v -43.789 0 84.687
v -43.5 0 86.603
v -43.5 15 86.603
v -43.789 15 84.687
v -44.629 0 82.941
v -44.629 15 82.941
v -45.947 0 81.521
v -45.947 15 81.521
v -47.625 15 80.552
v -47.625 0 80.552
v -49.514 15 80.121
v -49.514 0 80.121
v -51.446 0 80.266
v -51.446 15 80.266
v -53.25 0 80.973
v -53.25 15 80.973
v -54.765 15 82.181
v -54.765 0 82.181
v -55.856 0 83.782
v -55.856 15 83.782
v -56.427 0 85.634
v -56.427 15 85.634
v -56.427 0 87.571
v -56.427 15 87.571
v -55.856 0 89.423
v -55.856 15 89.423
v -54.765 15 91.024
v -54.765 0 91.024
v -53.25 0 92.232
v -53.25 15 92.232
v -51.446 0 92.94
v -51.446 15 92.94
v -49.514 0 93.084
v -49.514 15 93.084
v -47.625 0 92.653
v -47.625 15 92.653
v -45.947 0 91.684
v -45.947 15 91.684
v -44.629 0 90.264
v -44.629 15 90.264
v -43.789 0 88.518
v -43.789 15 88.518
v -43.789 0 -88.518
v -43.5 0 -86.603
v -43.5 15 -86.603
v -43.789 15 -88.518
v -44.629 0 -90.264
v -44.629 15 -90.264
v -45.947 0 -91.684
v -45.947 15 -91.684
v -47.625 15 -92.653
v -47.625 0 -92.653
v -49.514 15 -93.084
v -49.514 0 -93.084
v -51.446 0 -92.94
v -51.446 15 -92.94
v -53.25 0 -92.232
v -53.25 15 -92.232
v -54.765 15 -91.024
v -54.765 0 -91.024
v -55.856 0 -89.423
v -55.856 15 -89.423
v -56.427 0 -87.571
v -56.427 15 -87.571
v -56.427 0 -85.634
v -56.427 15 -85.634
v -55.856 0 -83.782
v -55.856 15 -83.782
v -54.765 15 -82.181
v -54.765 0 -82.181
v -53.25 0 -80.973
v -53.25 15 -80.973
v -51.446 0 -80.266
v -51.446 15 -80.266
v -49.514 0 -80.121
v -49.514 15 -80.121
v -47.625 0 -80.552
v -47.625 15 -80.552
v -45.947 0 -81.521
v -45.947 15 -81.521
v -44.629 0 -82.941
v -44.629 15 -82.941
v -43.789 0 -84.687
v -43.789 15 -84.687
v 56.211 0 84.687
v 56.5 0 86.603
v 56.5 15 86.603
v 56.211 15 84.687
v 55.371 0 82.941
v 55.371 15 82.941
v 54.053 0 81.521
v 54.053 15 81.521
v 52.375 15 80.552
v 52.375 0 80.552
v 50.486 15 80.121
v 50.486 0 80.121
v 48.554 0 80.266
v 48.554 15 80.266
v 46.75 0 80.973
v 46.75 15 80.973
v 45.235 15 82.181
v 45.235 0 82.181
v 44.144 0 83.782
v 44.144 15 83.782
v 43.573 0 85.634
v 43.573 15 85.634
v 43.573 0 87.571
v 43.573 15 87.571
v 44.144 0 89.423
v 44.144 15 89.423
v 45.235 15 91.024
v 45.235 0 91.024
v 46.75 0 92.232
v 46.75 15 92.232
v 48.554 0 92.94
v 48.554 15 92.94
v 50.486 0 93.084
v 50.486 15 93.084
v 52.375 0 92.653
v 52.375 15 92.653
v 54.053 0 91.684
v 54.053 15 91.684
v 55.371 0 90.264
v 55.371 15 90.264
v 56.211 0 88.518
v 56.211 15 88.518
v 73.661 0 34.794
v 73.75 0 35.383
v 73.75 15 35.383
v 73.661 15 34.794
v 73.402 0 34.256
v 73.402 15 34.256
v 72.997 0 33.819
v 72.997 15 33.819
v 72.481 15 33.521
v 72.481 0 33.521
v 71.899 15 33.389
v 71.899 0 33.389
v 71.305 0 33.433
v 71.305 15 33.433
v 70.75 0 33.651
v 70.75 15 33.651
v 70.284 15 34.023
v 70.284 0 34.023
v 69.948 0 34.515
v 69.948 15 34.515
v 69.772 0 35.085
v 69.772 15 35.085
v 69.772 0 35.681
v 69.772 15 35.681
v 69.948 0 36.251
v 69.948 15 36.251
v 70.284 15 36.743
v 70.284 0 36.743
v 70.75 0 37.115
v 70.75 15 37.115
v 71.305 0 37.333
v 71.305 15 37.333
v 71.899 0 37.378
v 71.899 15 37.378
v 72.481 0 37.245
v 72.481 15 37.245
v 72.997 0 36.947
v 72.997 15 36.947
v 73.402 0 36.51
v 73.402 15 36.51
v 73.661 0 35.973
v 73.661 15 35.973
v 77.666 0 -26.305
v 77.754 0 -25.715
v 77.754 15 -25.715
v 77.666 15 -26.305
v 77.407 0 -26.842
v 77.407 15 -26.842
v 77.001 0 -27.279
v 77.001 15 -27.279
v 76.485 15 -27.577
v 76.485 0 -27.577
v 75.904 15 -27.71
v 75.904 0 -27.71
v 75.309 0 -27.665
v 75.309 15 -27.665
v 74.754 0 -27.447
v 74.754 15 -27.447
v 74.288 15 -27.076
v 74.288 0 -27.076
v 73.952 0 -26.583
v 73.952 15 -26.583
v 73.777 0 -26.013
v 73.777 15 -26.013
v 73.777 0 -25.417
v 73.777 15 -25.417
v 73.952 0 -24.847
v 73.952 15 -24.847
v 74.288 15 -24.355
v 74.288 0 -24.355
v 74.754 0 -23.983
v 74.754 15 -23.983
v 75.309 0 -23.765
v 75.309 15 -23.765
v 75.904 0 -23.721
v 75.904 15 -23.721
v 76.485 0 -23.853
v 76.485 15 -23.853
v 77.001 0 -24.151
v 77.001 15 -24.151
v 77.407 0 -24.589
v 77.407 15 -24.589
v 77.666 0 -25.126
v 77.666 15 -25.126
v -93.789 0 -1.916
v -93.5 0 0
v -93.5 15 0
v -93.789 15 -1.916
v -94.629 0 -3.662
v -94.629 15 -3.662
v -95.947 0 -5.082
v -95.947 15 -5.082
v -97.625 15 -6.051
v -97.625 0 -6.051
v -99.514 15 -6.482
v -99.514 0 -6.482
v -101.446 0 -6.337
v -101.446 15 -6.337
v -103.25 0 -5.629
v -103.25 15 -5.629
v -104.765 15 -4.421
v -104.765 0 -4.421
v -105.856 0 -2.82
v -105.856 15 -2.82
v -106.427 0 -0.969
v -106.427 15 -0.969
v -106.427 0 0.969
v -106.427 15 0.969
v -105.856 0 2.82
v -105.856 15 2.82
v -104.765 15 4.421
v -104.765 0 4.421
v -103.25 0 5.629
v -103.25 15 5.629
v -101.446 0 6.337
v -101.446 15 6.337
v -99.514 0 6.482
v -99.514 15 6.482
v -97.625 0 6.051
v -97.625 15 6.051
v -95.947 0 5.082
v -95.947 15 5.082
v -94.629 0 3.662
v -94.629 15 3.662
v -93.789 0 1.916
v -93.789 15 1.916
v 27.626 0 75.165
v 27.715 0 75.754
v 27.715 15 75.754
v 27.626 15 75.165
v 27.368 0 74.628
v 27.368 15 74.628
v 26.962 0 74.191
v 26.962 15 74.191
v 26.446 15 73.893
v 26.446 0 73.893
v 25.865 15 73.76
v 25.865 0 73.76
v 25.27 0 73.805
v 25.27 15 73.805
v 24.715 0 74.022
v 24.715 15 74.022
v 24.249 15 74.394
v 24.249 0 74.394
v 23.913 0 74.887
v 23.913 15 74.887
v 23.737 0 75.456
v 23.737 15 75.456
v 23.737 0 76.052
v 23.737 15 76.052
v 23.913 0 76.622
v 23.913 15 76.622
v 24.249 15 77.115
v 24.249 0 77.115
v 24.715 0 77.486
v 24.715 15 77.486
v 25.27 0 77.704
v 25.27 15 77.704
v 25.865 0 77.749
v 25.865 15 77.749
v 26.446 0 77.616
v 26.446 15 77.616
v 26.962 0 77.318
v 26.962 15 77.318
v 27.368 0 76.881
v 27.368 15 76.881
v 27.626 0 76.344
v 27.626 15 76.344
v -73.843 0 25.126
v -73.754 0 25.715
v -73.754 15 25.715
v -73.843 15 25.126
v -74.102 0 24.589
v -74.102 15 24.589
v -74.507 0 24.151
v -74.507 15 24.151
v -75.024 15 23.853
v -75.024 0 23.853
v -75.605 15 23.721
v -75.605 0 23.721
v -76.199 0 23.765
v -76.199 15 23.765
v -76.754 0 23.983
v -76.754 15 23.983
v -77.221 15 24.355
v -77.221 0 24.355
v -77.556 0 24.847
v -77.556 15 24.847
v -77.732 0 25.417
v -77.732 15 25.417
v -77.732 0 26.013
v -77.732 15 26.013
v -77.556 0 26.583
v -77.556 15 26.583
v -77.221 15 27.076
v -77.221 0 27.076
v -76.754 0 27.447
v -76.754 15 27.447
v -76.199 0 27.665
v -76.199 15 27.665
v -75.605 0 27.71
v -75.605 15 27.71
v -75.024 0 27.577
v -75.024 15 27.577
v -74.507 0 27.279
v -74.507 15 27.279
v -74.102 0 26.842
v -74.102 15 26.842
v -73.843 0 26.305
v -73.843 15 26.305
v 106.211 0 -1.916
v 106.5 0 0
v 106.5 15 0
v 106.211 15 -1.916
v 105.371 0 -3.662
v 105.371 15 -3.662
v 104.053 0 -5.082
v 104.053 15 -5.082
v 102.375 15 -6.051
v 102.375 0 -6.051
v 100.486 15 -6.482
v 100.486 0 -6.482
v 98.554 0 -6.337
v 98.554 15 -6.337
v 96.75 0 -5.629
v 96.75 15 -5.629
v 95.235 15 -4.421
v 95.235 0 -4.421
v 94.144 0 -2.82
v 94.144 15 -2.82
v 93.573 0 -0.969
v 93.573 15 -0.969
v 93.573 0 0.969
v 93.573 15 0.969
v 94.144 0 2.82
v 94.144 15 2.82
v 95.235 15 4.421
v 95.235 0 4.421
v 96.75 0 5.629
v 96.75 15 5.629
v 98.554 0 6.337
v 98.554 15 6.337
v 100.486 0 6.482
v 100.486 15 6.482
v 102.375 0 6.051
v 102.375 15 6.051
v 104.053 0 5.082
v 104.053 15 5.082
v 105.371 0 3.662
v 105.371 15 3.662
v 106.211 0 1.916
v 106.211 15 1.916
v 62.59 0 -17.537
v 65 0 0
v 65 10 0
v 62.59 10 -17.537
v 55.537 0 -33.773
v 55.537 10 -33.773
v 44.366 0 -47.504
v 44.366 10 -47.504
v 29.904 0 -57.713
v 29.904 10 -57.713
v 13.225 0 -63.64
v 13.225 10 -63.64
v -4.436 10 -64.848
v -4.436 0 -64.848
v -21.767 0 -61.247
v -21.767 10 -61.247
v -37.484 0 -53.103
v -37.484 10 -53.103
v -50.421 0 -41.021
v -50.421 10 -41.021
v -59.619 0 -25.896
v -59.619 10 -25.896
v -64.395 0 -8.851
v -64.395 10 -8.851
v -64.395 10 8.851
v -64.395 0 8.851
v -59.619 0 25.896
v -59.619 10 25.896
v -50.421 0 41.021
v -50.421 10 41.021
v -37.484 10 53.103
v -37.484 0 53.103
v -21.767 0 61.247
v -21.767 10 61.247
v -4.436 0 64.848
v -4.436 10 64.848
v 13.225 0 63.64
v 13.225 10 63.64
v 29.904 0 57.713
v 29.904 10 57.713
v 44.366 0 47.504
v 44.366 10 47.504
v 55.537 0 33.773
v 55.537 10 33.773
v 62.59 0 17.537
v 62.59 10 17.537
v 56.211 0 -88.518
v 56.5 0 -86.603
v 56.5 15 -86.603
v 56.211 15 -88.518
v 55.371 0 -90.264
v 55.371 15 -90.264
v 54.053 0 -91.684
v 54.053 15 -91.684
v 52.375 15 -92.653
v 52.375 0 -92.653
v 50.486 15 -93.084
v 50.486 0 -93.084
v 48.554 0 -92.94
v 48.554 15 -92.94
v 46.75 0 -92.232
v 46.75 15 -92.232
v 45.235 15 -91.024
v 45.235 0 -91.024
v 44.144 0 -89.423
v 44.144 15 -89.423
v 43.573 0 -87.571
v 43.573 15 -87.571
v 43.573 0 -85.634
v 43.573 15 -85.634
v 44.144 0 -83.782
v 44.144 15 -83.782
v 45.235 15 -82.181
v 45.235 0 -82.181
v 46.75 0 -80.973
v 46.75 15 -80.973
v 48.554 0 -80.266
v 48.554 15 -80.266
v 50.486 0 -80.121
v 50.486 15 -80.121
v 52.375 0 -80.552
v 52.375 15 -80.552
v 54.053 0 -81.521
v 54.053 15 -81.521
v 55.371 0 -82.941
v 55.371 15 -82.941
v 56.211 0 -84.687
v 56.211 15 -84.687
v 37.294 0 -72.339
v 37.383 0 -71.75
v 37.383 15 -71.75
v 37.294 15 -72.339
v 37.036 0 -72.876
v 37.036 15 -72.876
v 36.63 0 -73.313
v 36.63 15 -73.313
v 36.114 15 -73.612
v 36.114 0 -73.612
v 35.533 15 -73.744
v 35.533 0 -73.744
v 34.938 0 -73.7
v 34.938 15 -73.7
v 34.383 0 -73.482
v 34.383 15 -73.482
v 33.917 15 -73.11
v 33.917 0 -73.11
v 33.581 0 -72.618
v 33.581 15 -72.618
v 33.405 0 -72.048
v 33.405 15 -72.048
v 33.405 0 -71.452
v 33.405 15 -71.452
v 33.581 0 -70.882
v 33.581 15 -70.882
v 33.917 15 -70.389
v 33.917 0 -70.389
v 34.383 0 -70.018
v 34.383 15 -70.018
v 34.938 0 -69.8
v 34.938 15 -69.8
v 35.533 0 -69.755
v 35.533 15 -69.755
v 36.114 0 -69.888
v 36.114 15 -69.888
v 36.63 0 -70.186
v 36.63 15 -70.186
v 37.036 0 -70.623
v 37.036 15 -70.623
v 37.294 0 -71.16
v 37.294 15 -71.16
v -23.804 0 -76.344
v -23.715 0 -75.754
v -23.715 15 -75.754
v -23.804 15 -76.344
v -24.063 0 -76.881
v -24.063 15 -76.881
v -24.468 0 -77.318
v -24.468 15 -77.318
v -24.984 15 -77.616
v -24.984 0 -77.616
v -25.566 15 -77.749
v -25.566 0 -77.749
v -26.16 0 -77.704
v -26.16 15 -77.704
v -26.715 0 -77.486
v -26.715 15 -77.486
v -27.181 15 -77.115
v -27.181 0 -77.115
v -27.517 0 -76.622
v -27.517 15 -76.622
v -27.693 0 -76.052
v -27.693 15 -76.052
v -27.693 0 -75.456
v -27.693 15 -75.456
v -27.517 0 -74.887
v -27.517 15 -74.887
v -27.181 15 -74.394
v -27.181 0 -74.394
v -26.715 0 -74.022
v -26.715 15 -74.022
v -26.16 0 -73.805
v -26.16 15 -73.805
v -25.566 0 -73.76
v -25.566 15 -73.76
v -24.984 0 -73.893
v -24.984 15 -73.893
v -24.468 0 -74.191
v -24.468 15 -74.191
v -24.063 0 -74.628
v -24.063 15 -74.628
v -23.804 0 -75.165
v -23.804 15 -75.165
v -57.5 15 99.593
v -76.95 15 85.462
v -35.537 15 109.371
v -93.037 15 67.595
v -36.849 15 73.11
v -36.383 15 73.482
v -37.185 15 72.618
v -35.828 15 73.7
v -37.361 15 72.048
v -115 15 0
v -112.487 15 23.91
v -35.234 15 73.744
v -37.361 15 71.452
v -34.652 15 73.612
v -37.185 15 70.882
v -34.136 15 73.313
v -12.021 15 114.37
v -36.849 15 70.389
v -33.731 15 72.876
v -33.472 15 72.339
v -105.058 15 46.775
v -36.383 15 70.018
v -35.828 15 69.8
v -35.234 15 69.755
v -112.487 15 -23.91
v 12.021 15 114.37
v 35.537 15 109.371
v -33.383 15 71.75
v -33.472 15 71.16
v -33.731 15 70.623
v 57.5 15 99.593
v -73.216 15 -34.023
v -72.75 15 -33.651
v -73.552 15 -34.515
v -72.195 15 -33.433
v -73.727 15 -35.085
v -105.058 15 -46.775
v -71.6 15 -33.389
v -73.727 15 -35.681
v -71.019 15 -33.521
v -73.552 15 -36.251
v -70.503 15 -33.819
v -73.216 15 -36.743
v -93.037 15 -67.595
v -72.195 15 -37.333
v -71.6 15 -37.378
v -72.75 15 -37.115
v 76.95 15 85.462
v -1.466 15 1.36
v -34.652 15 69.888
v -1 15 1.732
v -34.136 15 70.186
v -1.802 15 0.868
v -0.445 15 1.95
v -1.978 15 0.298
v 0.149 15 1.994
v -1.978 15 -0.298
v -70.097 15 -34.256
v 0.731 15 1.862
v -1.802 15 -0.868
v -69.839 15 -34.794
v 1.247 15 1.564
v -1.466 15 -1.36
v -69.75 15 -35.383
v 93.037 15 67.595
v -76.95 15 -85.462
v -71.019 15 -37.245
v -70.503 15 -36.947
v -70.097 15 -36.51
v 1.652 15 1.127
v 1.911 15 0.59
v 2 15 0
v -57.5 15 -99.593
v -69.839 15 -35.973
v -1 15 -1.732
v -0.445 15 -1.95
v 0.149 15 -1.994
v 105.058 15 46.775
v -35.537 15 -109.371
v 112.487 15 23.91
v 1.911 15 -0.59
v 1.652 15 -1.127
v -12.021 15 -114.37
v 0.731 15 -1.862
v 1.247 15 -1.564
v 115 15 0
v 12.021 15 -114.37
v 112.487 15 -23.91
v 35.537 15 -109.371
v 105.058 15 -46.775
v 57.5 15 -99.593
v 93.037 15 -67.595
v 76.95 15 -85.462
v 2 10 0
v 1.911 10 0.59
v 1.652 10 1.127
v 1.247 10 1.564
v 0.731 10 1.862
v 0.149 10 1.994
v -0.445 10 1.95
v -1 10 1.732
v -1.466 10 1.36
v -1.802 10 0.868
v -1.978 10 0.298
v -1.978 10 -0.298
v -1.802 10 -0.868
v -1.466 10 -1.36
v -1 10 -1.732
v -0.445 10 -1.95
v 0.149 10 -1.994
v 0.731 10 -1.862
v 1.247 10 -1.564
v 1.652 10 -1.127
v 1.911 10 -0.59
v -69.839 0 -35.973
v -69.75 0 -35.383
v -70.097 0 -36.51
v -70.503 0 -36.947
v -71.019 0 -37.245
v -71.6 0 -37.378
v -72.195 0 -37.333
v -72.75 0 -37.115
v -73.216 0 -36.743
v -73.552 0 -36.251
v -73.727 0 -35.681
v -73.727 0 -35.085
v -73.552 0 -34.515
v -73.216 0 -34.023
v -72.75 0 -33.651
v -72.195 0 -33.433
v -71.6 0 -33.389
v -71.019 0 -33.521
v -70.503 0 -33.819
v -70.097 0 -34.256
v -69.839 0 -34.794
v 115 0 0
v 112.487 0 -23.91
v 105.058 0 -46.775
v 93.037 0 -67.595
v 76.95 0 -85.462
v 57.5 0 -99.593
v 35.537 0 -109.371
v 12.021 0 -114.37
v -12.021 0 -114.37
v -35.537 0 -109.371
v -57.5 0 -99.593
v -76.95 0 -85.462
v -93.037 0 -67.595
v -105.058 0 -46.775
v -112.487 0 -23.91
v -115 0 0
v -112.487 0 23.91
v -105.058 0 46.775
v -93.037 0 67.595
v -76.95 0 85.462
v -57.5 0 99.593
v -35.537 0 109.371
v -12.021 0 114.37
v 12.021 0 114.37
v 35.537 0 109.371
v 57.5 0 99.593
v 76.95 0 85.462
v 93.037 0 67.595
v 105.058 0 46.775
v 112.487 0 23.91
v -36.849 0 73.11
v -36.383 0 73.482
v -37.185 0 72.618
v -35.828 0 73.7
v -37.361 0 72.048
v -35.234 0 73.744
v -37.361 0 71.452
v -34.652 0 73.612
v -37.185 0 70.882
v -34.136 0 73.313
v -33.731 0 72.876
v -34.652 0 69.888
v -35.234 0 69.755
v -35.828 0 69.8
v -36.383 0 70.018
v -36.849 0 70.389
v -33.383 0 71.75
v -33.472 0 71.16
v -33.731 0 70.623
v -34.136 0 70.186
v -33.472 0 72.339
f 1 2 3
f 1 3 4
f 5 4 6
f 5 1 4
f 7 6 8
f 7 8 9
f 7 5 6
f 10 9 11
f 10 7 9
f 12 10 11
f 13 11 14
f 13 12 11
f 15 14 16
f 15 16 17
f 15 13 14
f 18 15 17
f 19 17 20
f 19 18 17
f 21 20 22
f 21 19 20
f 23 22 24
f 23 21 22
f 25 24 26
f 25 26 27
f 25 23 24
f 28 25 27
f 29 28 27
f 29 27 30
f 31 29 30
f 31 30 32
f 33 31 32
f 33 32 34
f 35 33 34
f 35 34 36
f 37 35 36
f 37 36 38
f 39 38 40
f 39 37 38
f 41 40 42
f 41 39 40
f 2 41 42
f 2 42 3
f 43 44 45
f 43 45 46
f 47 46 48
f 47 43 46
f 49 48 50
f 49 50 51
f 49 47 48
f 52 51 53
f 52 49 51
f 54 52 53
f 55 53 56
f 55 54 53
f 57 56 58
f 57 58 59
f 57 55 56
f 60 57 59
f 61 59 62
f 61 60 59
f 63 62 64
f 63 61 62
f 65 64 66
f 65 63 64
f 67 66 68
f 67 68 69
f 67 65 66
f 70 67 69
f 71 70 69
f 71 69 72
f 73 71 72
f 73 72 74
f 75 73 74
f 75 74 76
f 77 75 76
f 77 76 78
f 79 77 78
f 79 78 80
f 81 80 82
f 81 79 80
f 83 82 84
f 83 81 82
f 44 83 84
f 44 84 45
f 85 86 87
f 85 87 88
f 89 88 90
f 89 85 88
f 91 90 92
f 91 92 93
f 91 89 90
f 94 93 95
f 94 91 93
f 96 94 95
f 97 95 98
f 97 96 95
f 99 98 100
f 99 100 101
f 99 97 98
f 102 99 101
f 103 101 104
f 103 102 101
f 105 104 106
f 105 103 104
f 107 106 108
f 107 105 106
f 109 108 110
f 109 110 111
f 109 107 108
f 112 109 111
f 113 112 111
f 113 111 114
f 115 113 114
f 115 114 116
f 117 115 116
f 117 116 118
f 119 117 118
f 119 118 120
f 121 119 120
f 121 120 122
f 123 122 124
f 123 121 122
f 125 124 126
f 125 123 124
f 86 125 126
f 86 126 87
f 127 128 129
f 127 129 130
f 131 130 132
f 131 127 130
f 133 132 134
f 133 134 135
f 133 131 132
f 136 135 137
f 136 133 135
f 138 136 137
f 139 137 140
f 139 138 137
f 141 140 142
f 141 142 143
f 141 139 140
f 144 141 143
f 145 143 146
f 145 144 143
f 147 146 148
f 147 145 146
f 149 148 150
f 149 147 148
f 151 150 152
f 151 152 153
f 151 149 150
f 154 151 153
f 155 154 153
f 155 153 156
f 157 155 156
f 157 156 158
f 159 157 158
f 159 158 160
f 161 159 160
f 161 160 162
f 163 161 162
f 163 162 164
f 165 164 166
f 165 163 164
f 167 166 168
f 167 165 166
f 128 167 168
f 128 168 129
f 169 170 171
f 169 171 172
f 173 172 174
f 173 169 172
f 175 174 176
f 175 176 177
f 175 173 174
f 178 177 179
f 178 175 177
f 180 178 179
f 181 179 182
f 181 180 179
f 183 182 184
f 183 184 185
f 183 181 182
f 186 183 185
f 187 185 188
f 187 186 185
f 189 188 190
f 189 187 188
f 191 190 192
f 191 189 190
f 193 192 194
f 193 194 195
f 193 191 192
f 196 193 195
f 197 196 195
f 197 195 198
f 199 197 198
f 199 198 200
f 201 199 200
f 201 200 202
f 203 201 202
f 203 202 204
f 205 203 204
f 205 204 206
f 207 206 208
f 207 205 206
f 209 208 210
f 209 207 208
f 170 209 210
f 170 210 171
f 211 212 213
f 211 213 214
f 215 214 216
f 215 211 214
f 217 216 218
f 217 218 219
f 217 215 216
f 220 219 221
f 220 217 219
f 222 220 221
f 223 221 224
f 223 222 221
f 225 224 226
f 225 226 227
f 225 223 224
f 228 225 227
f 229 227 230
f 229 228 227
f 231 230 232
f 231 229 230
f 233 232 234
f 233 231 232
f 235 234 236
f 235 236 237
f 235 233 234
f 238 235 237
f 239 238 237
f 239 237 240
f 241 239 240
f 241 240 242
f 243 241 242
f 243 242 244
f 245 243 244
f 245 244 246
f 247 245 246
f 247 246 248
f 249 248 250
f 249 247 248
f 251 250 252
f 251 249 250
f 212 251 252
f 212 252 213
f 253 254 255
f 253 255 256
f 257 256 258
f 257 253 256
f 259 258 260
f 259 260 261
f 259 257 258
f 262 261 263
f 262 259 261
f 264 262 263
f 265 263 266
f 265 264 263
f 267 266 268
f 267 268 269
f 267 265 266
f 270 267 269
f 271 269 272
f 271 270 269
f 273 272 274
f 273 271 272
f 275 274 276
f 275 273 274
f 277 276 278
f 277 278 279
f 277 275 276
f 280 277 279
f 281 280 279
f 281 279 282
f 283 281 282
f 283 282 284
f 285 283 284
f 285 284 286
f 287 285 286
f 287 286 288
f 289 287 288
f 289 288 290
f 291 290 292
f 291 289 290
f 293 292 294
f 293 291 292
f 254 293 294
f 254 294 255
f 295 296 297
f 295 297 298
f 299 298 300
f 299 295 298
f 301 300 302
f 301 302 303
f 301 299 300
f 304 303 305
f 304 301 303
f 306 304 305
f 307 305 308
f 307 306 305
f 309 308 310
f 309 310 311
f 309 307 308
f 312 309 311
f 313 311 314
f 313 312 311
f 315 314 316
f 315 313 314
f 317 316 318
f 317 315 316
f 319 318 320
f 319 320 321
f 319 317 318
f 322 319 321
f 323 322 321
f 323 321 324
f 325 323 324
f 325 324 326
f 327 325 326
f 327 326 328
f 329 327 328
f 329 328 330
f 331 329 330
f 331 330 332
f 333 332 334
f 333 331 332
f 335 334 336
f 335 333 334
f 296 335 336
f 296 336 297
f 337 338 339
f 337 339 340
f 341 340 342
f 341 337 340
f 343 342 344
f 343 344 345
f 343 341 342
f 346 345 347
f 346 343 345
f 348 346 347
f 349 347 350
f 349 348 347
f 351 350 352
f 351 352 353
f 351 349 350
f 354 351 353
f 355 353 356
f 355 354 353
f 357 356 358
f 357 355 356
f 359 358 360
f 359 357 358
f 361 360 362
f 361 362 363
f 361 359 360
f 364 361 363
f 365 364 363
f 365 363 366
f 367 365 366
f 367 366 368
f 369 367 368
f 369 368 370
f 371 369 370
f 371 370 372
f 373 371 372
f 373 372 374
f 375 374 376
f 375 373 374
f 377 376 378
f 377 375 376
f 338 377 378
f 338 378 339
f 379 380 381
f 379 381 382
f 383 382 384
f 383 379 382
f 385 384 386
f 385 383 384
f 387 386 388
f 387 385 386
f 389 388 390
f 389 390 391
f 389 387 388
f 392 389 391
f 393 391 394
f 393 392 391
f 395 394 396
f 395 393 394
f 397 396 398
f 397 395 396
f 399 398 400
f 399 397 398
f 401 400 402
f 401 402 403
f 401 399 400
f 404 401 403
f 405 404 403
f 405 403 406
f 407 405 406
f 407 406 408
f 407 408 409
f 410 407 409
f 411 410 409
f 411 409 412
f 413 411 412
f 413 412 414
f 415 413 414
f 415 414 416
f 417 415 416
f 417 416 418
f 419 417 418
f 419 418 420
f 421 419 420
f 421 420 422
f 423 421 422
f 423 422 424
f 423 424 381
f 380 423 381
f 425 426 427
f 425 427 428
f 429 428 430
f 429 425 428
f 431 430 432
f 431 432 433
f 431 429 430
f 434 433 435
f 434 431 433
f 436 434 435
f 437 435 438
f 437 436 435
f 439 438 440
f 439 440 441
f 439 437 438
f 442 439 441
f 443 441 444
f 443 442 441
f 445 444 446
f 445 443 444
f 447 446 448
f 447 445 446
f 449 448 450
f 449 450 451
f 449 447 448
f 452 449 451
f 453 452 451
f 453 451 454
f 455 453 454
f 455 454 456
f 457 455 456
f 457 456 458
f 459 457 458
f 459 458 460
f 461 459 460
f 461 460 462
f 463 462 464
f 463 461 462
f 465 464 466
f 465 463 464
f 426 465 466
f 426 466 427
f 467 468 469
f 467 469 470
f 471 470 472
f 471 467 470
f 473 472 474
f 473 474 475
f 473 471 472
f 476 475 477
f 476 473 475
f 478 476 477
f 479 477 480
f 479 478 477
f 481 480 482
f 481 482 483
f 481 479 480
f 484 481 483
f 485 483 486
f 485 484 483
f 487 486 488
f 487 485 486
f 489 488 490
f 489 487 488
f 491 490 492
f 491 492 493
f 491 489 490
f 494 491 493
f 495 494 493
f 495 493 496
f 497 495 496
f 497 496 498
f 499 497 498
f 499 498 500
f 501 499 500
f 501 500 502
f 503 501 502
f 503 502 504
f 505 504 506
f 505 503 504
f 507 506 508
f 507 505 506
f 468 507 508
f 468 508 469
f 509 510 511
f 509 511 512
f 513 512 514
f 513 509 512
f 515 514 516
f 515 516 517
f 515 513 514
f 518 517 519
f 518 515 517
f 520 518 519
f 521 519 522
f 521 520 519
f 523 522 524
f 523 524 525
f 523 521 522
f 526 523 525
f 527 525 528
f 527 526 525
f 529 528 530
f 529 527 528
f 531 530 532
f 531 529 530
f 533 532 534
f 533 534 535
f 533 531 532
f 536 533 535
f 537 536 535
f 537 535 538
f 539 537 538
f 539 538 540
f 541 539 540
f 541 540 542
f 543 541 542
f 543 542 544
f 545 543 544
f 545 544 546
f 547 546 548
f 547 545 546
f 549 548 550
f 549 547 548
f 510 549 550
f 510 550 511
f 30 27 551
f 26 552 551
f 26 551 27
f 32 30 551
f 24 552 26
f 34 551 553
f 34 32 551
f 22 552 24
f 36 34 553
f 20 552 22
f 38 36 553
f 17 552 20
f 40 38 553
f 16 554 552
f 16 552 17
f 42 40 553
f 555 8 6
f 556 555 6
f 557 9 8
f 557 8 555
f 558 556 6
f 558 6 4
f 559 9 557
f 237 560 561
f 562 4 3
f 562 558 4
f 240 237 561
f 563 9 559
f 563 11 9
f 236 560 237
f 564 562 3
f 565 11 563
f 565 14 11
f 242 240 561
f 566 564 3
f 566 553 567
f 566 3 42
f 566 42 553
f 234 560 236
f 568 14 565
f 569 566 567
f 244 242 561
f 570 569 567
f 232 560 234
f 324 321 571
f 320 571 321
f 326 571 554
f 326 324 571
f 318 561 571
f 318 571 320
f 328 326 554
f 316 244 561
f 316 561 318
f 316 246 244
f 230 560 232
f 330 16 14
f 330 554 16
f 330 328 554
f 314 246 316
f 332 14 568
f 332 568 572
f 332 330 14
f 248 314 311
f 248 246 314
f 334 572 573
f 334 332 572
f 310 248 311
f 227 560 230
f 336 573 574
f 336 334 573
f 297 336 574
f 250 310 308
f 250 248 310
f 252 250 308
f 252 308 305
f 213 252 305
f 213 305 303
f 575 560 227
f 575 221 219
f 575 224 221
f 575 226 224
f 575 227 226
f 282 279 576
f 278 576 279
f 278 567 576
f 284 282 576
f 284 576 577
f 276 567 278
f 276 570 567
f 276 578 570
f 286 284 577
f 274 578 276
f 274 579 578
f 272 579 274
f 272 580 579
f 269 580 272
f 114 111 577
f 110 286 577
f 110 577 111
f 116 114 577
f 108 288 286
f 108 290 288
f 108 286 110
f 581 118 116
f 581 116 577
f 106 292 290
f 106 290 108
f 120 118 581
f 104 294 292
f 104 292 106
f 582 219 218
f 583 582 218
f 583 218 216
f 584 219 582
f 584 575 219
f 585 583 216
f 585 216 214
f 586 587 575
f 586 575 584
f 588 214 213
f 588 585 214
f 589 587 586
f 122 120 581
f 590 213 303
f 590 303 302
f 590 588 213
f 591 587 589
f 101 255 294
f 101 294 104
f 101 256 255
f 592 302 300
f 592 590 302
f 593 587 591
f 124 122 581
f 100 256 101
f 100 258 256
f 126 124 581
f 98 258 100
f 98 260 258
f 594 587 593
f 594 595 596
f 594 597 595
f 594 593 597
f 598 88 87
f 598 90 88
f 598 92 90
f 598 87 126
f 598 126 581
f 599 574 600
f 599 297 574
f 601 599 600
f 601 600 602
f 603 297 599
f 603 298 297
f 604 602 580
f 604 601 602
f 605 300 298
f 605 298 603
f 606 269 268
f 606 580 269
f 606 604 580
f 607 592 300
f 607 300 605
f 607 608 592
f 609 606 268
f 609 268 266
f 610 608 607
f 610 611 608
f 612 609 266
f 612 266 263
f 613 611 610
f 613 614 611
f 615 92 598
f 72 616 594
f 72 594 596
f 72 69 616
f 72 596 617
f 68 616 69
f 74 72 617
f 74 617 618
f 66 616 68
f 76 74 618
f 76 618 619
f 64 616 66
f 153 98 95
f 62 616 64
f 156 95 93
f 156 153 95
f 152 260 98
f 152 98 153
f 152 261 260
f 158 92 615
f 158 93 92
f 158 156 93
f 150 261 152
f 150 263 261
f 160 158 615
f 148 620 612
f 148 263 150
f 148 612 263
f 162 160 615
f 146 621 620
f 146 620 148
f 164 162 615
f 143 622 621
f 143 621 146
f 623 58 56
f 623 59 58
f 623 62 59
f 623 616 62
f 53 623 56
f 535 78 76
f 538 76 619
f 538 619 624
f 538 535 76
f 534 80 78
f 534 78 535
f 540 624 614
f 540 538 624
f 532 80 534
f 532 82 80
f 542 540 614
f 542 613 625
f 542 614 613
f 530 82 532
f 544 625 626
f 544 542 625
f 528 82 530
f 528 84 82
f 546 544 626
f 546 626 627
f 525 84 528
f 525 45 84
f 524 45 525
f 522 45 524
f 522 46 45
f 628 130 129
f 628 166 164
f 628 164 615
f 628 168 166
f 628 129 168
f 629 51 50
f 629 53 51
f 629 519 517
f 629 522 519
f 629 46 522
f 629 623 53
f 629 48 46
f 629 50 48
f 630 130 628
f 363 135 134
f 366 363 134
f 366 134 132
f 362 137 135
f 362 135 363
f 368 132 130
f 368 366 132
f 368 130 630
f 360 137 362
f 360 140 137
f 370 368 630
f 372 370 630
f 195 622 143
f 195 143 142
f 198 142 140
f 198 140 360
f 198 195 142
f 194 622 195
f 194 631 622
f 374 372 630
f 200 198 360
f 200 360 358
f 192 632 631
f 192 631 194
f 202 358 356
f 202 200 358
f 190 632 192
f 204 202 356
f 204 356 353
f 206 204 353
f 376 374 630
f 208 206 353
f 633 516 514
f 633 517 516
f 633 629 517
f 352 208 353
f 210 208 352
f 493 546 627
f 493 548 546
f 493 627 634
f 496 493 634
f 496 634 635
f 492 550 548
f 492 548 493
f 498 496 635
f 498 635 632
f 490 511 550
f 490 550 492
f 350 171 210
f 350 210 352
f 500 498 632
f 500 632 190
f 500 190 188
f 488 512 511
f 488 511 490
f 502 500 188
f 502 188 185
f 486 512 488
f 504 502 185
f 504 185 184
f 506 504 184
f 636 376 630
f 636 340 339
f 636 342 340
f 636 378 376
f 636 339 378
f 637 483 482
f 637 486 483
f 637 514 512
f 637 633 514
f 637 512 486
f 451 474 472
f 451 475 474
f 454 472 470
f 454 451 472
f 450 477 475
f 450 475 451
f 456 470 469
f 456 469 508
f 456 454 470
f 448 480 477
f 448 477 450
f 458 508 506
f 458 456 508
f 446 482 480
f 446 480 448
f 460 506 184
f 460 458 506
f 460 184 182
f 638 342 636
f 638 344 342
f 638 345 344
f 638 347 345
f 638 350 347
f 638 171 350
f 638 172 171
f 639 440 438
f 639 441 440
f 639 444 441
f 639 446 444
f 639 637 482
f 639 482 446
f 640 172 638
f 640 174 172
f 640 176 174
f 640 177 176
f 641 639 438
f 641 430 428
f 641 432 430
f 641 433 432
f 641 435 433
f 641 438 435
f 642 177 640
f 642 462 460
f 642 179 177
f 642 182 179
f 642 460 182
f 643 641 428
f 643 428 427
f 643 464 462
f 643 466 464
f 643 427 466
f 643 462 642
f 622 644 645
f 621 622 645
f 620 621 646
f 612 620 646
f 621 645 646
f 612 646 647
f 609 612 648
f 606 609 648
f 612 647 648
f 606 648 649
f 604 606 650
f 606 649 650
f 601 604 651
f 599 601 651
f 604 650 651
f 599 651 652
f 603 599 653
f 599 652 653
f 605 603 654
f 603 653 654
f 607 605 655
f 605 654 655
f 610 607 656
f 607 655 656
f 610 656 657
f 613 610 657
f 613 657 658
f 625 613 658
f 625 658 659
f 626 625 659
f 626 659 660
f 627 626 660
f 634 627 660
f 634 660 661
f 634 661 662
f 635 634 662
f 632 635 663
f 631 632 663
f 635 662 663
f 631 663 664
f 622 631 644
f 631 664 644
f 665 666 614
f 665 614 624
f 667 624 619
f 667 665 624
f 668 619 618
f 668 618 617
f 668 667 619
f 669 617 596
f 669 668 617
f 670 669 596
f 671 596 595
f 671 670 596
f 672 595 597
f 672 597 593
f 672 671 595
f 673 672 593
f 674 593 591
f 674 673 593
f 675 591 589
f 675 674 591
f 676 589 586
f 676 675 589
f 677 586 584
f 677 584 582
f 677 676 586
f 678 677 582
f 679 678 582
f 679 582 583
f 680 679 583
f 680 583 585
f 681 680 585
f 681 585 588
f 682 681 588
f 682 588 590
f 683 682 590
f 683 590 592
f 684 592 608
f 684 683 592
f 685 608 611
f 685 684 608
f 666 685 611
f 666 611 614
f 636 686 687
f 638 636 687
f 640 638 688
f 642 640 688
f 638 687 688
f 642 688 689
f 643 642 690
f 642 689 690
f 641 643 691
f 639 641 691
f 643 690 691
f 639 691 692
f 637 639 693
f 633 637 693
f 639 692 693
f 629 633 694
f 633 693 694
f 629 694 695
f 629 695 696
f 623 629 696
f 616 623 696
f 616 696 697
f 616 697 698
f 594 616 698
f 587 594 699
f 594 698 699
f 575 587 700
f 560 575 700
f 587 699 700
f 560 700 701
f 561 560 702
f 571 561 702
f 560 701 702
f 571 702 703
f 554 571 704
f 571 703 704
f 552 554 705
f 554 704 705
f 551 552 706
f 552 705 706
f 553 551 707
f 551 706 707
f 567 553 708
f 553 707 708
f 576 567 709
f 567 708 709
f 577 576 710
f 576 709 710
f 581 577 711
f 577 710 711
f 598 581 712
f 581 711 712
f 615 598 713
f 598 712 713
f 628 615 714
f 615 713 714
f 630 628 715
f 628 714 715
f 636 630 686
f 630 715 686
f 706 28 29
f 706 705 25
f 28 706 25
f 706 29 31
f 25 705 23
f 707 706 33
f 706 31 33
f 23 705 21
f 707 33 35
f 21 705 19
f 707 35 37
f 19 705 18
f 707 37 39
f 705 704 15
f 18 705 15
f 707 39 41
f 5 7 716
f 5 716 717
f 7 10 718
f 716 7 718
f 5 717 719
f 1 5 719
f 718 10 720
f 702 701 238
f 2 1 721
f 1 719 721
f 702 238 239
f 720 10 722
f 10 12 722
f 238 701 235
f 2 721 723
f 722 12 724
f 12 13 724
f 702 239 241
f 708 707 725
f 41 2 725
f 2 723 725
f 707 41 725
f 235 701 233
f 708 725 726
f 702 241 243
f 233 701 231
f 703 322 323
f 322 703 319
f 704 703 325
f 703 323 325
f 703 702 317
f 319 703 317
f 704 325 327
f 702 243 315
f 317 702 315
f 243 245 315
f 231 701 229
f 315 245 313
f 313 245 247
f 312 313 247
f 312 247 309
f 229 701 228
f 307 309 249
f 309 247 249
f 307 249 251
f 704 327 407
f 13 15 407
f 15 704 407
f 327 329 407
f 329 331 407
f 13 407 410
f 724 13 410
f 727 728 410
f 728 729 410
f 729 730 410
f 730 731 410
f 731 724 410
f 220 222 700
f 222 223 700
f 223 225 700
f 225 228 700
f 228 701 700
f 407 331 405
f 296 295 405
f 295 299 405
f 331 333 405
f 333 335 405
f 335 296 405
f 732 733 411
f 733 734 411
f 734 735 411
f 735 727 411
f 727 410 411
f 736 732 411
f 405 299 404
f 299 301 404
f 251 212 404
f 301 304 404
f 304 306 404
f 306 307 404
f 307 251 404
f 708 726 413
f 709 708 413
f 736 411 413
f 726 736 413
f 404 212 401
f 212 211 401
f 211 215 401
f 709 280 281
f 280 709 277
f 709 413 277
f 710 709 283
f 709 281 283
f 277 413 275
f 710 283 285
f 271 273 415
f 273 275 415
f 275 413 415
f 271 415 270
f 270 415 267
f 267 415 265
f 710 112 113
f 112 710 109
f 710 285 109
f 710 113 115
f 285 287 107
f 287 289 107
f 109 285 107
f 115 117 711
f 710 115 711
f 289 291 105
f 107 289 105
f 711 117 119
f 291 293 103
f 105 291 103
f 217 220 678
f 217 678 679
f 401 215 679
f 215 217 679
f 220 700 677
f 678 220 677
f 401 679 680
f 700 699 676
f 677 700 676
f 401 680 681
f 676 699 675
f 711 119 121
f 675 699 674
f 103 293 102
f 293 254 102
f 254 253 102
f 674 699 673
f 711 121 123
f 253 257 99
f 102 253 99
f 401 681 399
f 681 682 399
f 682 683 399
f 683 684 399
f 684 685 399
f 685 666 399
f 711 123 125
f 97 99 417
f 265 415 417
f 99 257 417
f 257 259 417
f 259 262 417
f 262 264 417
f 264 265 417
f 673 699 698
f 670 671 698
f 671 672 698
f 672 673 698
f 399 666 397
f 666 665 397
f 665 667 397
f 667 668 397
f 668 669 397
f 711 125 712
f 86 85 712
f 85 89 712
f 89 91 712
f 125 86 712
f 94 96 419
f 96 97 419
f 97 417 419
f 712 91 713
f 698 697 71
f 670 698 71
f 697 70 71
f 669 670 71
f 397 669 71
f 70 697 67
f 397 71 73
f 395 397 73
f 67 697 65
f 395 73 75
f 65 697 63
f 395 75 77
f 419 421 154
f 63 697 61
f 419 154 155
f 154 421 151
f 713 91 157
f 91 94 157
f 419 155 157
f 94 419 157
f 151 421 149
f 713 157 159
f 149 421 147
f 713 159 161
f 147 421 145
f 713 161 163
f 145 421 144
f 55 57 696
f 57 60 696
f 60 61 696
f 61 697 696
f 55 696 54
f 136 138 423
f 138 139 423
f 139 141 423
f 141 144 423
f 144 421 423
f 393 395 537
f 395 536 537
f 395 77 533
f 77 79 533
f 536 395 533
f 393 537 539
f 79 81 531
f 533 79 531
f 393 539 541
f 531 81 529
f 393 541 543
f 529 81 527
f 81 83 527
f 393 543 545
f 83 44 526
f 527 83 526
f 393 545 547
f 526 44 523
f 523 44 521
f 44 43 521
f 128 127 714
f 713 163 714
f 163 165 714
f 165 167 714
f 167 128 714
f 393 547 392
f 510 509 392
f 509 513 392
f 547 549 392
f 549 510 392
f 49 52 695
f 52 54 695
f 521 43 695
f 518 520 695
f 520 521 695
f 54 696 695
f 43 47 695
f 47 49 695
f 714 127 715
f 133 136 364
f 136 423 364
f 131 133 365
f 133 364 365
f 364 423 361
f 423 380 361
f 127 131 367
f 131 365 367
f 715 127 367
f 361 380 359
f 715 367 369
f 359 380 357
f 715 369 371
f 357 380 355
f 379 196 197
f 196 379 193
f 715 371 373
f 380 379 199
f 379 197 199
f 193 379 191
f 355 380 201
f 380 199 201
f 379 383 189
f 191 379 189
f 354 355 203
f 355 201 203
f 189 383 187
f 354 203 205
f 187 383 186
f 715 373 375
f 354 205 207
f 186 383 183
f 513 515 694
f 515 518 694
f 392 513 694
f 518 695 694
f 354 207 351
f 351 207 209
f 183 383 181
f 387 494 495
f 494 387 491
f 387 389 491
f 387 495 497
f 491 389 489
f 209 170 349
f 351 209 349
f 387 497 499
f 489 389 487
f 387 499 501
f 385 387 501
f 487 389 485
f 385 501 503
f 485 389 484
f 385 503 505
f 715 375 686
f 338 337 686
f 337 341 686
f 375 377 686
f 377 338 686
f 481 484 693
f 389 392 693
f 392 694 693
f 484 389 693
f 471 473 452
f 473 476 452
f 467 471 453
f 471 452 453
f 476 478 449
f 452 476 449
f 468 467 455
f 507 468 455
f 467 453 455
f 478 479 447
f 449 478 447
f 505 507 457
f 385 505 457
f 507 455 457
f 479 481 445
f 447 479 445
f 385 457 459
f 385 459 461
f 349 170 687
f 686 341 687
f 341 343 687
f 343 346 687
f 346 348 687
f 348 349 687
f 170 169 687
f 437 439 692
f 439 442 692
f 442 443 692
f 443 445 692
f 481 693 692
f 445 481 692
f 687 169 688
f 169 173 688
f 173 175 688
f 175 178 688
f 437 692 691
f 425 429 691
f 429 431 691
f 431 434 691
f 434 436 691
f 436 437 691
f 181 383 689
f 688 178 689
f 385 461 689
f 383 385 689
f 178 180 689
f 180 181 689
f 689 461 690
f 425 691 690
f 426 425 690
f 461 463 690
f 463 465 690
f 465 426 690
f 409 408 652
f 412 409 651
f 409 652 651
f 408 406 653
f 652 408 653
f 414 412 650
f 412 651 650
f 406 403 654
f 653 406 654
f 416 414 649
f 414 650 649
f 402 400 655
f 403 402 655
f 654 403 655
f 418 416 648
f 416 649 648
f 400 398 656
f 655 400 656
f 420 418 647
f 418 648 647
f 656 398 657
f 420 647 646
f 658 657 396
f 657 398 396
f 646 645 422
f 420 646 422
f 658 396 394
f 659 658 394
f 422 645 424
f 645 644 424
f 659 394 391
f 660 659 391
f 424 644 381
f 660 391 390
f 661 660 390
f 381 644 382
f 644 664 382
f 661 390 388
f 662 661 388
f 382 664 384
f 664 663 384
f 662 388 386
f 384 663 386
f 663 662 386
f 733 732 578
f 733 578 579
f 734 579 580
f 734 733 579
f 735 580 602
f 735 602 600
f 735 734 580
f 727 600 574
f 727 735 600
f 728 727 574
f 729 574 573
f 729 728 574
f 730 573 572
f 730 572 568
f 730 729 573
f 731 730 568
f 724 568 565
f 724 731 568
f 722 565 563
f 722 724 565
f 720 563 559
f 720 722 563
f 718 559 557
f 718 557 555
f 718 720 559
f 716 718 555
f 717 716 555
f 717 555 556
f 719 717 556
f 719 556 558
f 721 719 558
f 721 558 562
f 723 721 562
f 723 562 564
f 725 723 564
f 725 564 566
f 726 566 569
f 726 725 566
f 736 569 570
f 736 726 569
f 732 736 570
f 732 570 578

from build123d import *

# Parameters (mm, degrees)
SKETCH1_R           = 115
SKETCH1_R_2         = 65
SKETCH1_R_3         = 6.5
SKETCH1_R_4         = 2
BOSS_EXTRUDE1_DEPTH = 15
SKETCH2_R           = 65
BOSS_EXTRUDE2_DEPTH = 5
SKETCH4_R           = 2
CUT_EXTRUDE1_DEPTH  = 5


with BuildPart() as part:
    # Sketch1 → Boss-Extrude1 (new body)
    with BuildSketch(Plane(origin=(0, 0, 0), x_dir=(1, 0, 0), z_dir=(0, 1, 0))):
        Circle(SKETCH1_R)
        Circle(SKETCH1_R_2, mode=Mode.SUBTRACT)
        with Locations((50, 86.602540378)):
            Circle(SKETCH1_R_3, mode=Mode.SUBTRACT)
        with Locations((100, 0)):
            Circle(SKETCH1_R_3, mode=Mode.SUBTRACT)
        with Locations((50, -86.602540378)):
            Circle(SKETCH1_R_3, mode=Mode.SUBTRACT)
        with Locations((-50, -86.602540378)):
            Circle(SKETCH1_R_3, mode=Mode.SUBTRACT)
        with Locations((-100, 0)):
            Circle(SKETCH1_R_3, mode=Mode.SUBTRACT)
        with Locations((-50, 86.602540378)):
            Circle(SKETCH1_R_3, mode=Mode.SUBTRACT)
        with Locations((-25.715157224, 75.75441036)):
            Circle(SKETCH1_R_4, mode=Mode.SUBTRACT)
        with Locations((35.383095218, 71.749819323)):
            Circle(SKETCH1_R_4, mode=Mode.SUBTRACT)
        with Locations((75.75441036, 25.715157224)):
            Circle(SKETCH1_R_4, mode=Mode.SUBTRACT)
        with Locations((71.749819323, -35.383095218)):
            Circle(SKETCH1_R_4, mode=Mode.SUBTRACT)
        with Locations((25.715157224, -75.75441036)):
            Circle(SKETCH1_R_4, mode=Mode.SUBTRACT)
        with Locations((-35.383095218, -71.749819323)):
            Circle(SKETCH1_R_4, mode=Mode.SUBTRACT)
        with Locations((-75.75441036, -25.715157224)):
            Circle(SKETCH1_R_4, mode=Mode.SUBTRACT)
        with Locations((-71.749819323, 35.383095218)):
            Circle(SKETCH1_R_4, mode=Mode.SUBTRACT)
    extrude(amount=BOSS_EXTRUDE1_DEPTH)

    # Sketch2 → Boss-Extrude2 (add)
    with BuildSketch(Plane(origin=(0, 15, 0), x_dir=(1, 0, 0), z_dir=(0, 1, 0))):
        Circle(SKETCH2_R)
    extrude(amount=-BOSS_EXTRUDE2_DEPTH)

    # Sketch4 → Cut-Extrude1 (cut)
    with BuildSketch(Plane.XZ.offset(-10)):
        Circle(SKETCH4_R)
    extrude(amount=-CUT_EXTRUDE1_DEPTH, mode=Mode.SUBTRACT)


solid = part.part
